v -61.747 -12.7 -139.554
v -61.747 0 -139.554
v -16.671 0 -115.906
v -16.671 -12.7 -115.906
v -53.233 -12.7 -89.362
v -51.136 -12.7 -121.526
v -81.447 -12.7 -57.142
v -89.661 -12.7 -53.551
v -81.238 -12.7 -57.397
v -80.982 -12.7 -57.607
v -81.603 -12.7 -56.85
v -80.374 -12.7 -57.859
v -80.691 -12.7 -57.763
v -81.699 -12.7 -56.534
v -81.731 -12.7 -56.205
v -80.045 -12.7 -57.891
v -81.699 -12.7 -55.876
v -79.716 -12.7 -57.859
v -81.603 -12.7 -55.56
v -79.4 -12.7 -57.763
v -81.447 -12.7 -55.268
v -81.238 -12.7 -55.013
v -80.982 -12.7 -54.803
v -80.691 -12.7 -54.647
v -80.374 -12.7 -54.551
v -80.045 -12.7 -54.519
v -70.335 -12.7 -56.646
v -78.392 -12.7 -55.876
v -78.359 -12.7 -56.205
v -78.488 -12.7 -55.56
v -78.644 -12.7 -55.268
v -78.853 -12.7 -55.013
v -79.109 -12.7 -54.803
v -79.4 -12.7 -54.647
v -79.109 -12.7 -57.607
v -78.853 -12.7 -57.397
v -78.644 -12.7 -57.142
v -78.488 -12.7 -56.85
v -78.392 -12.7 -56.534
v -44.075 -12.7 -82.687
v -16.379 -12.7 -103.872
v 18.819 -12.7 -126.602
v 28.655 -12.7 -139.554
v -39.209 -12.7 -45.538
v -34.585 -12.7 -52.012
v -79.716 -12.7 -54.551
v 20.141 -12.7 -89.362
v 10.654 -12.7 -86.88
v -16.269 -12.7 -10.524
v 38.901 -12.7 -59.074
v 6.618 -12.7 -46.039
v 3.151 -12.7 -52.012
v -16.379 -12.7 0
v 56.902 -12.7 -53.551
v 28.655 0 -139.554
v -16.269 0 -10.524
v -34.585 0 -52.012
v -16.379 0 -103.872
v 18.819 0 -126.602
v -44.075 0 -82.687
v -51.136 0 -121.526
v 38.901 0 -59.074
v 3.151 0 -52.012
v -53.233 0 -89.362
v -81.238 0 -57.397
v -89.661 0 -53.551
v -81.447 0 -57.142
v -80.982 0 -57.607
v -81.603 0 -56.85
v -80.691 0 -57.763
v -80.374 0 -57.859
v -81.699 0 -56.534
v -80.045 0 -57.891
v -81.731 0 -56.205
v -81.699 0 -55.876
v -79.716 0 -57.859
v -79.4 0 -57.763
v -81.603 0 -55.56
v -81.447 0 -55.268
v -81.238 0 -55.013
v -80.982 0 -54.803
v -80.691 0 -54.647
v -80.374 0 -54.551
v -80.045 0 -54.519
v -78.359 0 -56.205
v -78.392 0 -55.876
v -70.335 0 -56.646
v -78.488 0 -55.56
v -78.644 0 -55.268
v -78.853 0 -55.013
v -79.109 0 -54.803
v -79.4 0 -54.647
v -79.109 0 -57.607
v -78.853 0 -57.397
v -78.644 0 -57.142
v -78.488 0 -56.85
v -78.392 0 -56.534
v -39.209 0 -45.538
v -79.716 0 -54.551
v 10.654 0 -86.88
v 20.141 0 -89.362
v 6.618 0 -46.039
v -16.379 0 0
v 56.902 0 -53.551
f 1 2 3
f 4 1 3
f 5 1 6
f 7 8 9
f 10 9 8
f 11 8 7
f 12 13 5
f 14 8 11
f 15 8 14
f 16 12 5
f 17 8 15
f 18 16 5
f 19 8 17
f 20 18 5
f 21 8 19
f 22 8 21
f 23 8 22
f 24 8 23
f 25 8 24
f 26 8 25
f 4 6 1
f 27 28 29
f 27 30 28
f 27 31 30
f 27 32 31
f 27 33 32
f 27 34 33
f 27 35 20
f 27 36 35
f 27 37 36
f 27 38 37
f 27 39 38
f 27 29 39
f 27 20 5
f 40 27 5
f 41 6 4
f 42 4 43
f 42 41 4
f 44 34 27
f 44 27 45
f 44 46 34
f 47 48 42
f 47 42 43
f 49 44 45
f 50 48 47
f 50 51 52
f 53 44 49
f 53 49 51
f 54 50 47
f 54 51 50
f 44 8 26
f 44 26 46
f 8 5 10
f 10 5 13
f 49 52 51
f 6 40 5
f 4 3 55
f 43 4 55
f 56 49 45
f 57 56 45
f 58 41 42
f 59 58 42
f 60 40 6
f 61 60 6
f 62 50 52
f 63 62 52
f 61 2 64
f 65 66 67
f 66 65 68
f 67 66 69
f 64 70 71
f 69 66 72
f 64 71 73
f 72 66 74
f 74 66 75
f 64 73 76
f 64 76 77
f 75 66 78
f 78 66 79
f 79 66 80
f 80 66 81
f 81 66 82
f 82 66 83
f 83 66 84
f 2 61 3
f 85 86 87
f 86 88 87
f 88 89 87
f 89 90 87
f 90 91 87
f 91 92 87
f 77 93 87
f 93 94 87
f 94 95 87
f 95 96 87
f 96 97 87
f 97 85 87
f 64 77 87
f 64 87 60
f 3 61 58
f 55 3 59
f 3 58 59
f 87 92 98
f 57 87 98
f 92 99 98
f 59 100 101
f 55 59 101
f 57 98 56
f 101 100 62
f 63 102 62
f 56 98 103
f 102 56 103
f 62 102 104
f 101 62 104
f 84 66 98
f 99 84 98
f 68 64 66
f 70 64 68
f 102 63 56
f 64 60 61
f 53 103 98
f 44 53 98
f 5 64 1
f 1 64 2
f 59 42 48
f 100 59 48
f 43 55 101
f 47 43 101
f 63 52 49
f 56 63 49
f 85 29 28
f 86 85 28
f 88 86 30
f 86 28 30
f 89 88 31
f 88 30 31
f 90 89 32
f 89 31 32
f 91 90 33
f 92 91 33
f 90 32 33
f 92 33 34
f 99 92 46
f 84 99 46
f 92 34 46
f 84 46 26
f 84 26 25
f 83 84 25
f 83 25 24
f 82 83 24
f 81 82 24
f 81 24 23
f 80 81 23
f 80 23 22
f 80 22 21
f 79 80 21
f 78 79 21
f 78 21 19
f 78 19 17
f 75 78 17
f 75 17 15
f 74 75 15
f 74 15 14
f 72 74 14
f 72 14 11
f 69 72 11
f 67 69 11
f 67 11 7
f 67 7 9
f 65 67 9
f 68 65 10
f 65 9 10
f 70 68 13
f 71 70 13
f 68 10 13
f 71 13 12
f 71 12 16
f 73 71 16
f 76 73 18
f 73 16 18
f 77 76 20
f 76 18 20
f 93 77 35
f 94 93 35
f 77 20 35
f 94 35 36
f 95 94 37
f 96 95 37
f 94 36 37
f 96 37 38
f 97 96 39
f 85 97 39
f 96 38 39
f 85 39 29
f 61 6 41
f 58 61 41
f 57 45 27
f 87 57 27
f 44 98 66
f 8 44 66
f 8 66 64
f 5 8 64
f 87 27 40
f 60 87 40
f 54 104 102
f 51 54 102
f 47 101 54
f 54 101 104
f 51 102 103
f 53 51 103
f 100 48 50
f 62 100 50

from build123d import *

# Parameters (mm, degrees)
F1_DEPTH = 12.7
F3_DEPTH = 25.4
F4_R     = 1.685949
F5_DEPTH = 25.4


with BuildPart() as f1:
    # F0 (on Front) → F1 (new body)
    with BuildSketch(Plane.XZ):
        Polygon((6.618203, -46.038546), (-16.379258, 0), (-39.209124, -45.537699), (-89.660898, -53.551219), (-53.232785, -89.361645), (-61.747152, -139.553732), (-16.671093, -115.906432), (28.655386, -139.553732), (20.14102, -89.361645), (56.902383, -53.551219), align=None)
    extrude(amount=F1_DEPTH)

    # F2 (on face) → F3 (cut)
    with BuildSketch(Plane.XZ.offset(12.7)):
        Polygon((3.150909, -52.012134), (-16.268918, -10.524325), (-34.585346, -52.012134), (-70.335478, -56.646414), (-44.074576, -82.686633), (-51.136333, -121.526286), (-16.379258, -103.871897), (18.819179, -126.60192), (10.654025, -86.879551), (38.901042, -59.073891), align=None)
    extrude(amount=-F3_DEPTH, mode=Mode.SUBTRACT)

    # F4 (on face) → F5 (cut)
    with BuildSketch(Plane.XZ.offset(12.7)):
        with Locations((-80.045395, -56.205053)):
            Circle(F4_R)
    extrude(amount=-F5_DEPTH, mode=Mode.SUBTRACT)


solid = f1.part
